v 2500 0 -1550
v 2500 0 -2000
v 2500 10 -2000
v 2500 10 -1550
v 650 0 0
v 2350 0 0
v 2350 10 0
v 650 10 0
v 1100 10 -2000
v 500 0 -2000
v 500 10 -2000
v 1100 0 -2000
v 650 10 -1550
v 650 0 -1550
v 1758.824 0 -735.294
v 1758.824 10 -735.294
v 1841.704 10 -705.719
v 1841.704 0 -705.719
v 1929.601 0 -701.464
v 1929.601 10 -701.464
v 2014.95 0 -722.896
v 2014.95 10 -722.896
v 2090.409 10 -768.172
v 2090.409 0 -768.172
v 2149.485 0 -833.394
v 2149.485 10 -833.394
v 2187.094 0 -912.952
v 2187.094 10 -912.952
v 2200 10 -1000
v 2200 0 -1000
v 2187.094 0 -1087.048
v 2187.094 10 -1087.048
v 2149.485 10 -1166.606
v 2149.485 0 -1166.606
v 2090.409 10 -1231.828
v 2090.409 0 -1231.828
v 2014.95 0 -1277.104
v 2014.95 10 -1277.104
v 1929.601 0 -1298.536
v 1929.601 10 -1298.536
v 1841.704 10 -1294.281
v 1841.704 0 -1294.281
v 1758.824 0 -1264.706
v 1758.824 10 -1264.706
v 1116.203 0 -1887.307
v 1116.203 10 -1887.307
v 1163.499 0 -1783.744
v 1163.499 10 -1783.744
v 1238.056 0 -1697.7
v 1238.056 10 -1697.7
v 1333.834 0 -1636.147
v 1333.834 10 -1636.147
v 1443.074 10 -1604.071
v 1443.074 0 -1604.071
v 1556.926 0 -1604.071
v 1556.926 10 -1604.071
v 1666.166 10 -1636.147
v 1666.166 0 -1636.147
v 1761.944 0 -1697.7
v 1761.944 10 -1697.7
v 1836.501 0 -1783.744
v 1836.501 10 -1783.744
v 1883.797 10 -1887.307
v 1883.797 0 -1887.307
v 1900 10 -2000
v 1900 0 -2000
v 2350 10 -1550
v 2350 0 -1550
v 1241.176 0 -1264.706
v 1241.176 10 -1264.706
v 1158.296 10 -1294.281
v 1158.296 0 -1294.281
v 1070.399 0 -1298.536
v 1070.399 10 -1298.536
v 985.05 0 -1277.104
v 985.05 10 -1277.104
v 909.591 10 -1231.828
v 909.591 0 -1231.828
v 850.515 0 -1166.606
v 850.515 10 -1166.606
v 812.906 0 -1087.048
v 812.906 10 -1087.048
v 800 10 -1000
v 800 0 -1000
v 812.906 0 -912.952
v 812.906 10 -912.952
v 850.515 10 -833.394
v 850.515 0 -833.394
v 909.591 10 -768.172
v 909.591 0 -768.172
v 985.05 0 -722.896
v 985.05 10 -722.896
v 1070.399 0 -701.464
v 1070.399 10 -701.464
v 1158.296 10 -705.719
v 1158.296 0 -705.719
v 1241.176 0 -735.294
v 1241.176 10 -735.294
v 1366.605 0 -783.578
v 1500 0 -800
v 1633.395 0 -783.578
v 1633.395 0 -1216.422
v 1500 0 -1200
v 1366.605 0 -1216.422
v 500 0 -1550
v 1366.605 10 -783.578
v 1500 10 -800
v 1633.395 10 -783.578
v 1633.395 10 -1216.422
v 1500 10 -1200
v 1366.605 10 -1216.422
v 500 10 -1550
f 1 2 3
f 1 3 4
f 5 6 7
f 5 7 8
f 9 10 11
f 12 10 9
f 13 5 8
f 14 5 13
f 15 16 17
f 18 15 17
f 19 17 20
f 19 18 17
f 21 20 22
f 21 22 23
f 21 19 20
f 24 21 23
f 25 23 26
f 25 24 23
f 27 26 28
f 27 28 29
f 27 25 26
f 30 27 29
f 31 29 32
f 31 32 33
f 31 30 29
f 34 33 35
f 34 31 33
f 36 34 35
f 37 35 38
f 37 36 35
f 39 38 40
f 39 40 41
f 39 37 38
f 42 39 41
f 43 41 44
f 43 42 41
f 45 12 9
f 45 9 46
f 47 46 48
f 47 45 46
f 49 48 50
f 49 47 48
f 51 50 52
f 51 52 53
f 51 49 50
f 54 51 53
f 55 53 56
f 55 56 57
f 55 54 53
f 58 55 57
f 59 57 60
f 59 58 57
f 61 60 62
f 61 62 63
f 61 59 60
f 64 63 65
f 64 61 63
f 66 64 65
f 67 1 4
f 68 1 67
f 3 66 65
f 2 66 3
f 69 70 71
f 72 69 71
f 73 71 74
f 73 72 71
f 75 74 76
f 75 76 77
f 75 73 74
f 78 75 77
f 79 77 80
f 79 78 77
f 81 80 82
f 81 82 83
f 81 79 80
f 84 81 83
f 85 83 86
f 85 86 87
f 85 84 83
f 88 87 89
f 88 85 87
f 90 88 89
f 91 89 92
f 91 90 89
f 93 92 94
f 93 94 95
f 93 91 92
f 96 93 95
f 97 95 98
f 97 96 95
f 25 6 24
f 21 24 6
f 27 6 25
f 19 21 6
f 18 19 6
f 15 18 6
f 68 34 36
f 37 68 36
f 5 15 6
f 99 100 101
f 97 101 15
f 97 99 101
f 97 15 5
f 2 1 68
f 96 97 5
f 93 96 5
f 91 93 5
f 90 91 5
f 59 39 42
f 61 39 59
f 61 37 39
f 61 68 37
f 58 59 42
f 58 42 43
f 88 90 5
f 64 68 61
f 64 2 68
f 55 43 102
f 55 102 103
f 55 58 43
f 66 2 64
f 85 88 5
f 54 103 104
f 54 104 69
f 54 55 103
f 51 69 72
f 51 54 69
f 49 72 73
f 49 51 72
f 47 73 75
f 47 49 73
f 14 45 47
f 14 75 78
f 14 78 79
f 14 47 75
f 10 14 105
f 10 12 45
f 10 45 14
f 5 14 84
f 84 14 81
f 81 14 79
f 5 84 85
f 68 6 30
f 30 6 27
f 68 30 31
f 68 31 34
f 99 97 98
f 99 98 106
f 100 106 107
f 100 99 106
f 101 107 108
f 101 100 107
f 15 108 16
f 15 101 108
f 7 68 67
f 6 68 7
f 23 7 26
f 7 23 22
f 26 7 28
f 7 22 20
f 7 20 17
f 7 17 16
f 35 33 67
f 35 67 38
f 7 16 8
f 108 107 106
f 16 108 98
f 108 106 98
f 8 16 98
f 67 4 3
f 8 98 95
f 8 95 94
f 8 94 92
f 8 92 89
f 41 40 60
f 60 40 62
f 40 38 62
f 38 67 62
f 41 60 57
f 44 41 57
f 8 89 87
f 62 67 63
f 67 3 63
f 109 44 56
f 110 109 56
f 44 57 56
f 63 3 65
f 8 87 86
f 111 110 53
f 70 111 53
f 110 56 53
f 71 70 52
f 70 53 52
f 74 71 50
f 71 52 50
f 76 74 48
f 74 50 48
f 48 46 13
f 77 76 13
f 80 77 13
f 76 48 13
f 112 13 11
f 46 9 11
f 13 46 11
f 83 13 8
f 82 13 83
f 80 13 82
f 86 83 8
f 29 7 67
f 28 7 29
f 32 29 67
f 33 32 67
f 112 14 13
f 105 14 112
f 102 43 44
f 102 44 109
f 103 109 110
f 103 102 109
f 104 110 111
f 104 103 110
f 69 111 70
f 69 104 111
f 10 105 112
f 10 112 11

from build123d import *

# Parameters (mm, degrees)
EXTRUSION1_DEPTH = 10


with BuildPart() as part:
    # Esquisse1 → Extrusion1 (new body)
    with BuildSketch(Plane(origin=(0, 0, 0), x_dir=(1, 0, 0), z_dir=(0, 1, 0))):
        with BuildLine():
            Line((2350, 0), (650, 0))
            Line((650, 0), (650, 1550))
            Line((650, 1550), (500, 1550))
            Line((500, 1550), (500, 2000))
            Line((500, 2000), (1100, 2000))
            ThreePointArc((1100, 2000), (1500, 1600), (1900, 2000))
            Line((1900, 2000), (2500, 2000))
            Line((2500, 2000), (2500, 1550))
            Line((2500, 1550), (2350, 1550))
            Line((2350, 1550), (2350, 0))
        make_face()
        with BuildLine():
            ThreePointArc((1241.176470588, 1264.705882353), (800, 1000), (1241.176470588, 735.294117647))
            ThreePointArc((1241.176470588, 735.294117647), (1500, 800), (1758.823529412, 735.294117647))
            ThreePointArc((1758.823529412, 735.294117647), (2200, 1000), (1758.823529412, 1264.705882353))
            ThreePointArc((1758.823529412, 1264.705882353), (1500, 1200), (1241.176470588, 1264.705882353))
        make_face(mode=Mode.SUBTRACT)
    extrude(amount=EXTRUSION1_DEPTH)


solid = part.part
